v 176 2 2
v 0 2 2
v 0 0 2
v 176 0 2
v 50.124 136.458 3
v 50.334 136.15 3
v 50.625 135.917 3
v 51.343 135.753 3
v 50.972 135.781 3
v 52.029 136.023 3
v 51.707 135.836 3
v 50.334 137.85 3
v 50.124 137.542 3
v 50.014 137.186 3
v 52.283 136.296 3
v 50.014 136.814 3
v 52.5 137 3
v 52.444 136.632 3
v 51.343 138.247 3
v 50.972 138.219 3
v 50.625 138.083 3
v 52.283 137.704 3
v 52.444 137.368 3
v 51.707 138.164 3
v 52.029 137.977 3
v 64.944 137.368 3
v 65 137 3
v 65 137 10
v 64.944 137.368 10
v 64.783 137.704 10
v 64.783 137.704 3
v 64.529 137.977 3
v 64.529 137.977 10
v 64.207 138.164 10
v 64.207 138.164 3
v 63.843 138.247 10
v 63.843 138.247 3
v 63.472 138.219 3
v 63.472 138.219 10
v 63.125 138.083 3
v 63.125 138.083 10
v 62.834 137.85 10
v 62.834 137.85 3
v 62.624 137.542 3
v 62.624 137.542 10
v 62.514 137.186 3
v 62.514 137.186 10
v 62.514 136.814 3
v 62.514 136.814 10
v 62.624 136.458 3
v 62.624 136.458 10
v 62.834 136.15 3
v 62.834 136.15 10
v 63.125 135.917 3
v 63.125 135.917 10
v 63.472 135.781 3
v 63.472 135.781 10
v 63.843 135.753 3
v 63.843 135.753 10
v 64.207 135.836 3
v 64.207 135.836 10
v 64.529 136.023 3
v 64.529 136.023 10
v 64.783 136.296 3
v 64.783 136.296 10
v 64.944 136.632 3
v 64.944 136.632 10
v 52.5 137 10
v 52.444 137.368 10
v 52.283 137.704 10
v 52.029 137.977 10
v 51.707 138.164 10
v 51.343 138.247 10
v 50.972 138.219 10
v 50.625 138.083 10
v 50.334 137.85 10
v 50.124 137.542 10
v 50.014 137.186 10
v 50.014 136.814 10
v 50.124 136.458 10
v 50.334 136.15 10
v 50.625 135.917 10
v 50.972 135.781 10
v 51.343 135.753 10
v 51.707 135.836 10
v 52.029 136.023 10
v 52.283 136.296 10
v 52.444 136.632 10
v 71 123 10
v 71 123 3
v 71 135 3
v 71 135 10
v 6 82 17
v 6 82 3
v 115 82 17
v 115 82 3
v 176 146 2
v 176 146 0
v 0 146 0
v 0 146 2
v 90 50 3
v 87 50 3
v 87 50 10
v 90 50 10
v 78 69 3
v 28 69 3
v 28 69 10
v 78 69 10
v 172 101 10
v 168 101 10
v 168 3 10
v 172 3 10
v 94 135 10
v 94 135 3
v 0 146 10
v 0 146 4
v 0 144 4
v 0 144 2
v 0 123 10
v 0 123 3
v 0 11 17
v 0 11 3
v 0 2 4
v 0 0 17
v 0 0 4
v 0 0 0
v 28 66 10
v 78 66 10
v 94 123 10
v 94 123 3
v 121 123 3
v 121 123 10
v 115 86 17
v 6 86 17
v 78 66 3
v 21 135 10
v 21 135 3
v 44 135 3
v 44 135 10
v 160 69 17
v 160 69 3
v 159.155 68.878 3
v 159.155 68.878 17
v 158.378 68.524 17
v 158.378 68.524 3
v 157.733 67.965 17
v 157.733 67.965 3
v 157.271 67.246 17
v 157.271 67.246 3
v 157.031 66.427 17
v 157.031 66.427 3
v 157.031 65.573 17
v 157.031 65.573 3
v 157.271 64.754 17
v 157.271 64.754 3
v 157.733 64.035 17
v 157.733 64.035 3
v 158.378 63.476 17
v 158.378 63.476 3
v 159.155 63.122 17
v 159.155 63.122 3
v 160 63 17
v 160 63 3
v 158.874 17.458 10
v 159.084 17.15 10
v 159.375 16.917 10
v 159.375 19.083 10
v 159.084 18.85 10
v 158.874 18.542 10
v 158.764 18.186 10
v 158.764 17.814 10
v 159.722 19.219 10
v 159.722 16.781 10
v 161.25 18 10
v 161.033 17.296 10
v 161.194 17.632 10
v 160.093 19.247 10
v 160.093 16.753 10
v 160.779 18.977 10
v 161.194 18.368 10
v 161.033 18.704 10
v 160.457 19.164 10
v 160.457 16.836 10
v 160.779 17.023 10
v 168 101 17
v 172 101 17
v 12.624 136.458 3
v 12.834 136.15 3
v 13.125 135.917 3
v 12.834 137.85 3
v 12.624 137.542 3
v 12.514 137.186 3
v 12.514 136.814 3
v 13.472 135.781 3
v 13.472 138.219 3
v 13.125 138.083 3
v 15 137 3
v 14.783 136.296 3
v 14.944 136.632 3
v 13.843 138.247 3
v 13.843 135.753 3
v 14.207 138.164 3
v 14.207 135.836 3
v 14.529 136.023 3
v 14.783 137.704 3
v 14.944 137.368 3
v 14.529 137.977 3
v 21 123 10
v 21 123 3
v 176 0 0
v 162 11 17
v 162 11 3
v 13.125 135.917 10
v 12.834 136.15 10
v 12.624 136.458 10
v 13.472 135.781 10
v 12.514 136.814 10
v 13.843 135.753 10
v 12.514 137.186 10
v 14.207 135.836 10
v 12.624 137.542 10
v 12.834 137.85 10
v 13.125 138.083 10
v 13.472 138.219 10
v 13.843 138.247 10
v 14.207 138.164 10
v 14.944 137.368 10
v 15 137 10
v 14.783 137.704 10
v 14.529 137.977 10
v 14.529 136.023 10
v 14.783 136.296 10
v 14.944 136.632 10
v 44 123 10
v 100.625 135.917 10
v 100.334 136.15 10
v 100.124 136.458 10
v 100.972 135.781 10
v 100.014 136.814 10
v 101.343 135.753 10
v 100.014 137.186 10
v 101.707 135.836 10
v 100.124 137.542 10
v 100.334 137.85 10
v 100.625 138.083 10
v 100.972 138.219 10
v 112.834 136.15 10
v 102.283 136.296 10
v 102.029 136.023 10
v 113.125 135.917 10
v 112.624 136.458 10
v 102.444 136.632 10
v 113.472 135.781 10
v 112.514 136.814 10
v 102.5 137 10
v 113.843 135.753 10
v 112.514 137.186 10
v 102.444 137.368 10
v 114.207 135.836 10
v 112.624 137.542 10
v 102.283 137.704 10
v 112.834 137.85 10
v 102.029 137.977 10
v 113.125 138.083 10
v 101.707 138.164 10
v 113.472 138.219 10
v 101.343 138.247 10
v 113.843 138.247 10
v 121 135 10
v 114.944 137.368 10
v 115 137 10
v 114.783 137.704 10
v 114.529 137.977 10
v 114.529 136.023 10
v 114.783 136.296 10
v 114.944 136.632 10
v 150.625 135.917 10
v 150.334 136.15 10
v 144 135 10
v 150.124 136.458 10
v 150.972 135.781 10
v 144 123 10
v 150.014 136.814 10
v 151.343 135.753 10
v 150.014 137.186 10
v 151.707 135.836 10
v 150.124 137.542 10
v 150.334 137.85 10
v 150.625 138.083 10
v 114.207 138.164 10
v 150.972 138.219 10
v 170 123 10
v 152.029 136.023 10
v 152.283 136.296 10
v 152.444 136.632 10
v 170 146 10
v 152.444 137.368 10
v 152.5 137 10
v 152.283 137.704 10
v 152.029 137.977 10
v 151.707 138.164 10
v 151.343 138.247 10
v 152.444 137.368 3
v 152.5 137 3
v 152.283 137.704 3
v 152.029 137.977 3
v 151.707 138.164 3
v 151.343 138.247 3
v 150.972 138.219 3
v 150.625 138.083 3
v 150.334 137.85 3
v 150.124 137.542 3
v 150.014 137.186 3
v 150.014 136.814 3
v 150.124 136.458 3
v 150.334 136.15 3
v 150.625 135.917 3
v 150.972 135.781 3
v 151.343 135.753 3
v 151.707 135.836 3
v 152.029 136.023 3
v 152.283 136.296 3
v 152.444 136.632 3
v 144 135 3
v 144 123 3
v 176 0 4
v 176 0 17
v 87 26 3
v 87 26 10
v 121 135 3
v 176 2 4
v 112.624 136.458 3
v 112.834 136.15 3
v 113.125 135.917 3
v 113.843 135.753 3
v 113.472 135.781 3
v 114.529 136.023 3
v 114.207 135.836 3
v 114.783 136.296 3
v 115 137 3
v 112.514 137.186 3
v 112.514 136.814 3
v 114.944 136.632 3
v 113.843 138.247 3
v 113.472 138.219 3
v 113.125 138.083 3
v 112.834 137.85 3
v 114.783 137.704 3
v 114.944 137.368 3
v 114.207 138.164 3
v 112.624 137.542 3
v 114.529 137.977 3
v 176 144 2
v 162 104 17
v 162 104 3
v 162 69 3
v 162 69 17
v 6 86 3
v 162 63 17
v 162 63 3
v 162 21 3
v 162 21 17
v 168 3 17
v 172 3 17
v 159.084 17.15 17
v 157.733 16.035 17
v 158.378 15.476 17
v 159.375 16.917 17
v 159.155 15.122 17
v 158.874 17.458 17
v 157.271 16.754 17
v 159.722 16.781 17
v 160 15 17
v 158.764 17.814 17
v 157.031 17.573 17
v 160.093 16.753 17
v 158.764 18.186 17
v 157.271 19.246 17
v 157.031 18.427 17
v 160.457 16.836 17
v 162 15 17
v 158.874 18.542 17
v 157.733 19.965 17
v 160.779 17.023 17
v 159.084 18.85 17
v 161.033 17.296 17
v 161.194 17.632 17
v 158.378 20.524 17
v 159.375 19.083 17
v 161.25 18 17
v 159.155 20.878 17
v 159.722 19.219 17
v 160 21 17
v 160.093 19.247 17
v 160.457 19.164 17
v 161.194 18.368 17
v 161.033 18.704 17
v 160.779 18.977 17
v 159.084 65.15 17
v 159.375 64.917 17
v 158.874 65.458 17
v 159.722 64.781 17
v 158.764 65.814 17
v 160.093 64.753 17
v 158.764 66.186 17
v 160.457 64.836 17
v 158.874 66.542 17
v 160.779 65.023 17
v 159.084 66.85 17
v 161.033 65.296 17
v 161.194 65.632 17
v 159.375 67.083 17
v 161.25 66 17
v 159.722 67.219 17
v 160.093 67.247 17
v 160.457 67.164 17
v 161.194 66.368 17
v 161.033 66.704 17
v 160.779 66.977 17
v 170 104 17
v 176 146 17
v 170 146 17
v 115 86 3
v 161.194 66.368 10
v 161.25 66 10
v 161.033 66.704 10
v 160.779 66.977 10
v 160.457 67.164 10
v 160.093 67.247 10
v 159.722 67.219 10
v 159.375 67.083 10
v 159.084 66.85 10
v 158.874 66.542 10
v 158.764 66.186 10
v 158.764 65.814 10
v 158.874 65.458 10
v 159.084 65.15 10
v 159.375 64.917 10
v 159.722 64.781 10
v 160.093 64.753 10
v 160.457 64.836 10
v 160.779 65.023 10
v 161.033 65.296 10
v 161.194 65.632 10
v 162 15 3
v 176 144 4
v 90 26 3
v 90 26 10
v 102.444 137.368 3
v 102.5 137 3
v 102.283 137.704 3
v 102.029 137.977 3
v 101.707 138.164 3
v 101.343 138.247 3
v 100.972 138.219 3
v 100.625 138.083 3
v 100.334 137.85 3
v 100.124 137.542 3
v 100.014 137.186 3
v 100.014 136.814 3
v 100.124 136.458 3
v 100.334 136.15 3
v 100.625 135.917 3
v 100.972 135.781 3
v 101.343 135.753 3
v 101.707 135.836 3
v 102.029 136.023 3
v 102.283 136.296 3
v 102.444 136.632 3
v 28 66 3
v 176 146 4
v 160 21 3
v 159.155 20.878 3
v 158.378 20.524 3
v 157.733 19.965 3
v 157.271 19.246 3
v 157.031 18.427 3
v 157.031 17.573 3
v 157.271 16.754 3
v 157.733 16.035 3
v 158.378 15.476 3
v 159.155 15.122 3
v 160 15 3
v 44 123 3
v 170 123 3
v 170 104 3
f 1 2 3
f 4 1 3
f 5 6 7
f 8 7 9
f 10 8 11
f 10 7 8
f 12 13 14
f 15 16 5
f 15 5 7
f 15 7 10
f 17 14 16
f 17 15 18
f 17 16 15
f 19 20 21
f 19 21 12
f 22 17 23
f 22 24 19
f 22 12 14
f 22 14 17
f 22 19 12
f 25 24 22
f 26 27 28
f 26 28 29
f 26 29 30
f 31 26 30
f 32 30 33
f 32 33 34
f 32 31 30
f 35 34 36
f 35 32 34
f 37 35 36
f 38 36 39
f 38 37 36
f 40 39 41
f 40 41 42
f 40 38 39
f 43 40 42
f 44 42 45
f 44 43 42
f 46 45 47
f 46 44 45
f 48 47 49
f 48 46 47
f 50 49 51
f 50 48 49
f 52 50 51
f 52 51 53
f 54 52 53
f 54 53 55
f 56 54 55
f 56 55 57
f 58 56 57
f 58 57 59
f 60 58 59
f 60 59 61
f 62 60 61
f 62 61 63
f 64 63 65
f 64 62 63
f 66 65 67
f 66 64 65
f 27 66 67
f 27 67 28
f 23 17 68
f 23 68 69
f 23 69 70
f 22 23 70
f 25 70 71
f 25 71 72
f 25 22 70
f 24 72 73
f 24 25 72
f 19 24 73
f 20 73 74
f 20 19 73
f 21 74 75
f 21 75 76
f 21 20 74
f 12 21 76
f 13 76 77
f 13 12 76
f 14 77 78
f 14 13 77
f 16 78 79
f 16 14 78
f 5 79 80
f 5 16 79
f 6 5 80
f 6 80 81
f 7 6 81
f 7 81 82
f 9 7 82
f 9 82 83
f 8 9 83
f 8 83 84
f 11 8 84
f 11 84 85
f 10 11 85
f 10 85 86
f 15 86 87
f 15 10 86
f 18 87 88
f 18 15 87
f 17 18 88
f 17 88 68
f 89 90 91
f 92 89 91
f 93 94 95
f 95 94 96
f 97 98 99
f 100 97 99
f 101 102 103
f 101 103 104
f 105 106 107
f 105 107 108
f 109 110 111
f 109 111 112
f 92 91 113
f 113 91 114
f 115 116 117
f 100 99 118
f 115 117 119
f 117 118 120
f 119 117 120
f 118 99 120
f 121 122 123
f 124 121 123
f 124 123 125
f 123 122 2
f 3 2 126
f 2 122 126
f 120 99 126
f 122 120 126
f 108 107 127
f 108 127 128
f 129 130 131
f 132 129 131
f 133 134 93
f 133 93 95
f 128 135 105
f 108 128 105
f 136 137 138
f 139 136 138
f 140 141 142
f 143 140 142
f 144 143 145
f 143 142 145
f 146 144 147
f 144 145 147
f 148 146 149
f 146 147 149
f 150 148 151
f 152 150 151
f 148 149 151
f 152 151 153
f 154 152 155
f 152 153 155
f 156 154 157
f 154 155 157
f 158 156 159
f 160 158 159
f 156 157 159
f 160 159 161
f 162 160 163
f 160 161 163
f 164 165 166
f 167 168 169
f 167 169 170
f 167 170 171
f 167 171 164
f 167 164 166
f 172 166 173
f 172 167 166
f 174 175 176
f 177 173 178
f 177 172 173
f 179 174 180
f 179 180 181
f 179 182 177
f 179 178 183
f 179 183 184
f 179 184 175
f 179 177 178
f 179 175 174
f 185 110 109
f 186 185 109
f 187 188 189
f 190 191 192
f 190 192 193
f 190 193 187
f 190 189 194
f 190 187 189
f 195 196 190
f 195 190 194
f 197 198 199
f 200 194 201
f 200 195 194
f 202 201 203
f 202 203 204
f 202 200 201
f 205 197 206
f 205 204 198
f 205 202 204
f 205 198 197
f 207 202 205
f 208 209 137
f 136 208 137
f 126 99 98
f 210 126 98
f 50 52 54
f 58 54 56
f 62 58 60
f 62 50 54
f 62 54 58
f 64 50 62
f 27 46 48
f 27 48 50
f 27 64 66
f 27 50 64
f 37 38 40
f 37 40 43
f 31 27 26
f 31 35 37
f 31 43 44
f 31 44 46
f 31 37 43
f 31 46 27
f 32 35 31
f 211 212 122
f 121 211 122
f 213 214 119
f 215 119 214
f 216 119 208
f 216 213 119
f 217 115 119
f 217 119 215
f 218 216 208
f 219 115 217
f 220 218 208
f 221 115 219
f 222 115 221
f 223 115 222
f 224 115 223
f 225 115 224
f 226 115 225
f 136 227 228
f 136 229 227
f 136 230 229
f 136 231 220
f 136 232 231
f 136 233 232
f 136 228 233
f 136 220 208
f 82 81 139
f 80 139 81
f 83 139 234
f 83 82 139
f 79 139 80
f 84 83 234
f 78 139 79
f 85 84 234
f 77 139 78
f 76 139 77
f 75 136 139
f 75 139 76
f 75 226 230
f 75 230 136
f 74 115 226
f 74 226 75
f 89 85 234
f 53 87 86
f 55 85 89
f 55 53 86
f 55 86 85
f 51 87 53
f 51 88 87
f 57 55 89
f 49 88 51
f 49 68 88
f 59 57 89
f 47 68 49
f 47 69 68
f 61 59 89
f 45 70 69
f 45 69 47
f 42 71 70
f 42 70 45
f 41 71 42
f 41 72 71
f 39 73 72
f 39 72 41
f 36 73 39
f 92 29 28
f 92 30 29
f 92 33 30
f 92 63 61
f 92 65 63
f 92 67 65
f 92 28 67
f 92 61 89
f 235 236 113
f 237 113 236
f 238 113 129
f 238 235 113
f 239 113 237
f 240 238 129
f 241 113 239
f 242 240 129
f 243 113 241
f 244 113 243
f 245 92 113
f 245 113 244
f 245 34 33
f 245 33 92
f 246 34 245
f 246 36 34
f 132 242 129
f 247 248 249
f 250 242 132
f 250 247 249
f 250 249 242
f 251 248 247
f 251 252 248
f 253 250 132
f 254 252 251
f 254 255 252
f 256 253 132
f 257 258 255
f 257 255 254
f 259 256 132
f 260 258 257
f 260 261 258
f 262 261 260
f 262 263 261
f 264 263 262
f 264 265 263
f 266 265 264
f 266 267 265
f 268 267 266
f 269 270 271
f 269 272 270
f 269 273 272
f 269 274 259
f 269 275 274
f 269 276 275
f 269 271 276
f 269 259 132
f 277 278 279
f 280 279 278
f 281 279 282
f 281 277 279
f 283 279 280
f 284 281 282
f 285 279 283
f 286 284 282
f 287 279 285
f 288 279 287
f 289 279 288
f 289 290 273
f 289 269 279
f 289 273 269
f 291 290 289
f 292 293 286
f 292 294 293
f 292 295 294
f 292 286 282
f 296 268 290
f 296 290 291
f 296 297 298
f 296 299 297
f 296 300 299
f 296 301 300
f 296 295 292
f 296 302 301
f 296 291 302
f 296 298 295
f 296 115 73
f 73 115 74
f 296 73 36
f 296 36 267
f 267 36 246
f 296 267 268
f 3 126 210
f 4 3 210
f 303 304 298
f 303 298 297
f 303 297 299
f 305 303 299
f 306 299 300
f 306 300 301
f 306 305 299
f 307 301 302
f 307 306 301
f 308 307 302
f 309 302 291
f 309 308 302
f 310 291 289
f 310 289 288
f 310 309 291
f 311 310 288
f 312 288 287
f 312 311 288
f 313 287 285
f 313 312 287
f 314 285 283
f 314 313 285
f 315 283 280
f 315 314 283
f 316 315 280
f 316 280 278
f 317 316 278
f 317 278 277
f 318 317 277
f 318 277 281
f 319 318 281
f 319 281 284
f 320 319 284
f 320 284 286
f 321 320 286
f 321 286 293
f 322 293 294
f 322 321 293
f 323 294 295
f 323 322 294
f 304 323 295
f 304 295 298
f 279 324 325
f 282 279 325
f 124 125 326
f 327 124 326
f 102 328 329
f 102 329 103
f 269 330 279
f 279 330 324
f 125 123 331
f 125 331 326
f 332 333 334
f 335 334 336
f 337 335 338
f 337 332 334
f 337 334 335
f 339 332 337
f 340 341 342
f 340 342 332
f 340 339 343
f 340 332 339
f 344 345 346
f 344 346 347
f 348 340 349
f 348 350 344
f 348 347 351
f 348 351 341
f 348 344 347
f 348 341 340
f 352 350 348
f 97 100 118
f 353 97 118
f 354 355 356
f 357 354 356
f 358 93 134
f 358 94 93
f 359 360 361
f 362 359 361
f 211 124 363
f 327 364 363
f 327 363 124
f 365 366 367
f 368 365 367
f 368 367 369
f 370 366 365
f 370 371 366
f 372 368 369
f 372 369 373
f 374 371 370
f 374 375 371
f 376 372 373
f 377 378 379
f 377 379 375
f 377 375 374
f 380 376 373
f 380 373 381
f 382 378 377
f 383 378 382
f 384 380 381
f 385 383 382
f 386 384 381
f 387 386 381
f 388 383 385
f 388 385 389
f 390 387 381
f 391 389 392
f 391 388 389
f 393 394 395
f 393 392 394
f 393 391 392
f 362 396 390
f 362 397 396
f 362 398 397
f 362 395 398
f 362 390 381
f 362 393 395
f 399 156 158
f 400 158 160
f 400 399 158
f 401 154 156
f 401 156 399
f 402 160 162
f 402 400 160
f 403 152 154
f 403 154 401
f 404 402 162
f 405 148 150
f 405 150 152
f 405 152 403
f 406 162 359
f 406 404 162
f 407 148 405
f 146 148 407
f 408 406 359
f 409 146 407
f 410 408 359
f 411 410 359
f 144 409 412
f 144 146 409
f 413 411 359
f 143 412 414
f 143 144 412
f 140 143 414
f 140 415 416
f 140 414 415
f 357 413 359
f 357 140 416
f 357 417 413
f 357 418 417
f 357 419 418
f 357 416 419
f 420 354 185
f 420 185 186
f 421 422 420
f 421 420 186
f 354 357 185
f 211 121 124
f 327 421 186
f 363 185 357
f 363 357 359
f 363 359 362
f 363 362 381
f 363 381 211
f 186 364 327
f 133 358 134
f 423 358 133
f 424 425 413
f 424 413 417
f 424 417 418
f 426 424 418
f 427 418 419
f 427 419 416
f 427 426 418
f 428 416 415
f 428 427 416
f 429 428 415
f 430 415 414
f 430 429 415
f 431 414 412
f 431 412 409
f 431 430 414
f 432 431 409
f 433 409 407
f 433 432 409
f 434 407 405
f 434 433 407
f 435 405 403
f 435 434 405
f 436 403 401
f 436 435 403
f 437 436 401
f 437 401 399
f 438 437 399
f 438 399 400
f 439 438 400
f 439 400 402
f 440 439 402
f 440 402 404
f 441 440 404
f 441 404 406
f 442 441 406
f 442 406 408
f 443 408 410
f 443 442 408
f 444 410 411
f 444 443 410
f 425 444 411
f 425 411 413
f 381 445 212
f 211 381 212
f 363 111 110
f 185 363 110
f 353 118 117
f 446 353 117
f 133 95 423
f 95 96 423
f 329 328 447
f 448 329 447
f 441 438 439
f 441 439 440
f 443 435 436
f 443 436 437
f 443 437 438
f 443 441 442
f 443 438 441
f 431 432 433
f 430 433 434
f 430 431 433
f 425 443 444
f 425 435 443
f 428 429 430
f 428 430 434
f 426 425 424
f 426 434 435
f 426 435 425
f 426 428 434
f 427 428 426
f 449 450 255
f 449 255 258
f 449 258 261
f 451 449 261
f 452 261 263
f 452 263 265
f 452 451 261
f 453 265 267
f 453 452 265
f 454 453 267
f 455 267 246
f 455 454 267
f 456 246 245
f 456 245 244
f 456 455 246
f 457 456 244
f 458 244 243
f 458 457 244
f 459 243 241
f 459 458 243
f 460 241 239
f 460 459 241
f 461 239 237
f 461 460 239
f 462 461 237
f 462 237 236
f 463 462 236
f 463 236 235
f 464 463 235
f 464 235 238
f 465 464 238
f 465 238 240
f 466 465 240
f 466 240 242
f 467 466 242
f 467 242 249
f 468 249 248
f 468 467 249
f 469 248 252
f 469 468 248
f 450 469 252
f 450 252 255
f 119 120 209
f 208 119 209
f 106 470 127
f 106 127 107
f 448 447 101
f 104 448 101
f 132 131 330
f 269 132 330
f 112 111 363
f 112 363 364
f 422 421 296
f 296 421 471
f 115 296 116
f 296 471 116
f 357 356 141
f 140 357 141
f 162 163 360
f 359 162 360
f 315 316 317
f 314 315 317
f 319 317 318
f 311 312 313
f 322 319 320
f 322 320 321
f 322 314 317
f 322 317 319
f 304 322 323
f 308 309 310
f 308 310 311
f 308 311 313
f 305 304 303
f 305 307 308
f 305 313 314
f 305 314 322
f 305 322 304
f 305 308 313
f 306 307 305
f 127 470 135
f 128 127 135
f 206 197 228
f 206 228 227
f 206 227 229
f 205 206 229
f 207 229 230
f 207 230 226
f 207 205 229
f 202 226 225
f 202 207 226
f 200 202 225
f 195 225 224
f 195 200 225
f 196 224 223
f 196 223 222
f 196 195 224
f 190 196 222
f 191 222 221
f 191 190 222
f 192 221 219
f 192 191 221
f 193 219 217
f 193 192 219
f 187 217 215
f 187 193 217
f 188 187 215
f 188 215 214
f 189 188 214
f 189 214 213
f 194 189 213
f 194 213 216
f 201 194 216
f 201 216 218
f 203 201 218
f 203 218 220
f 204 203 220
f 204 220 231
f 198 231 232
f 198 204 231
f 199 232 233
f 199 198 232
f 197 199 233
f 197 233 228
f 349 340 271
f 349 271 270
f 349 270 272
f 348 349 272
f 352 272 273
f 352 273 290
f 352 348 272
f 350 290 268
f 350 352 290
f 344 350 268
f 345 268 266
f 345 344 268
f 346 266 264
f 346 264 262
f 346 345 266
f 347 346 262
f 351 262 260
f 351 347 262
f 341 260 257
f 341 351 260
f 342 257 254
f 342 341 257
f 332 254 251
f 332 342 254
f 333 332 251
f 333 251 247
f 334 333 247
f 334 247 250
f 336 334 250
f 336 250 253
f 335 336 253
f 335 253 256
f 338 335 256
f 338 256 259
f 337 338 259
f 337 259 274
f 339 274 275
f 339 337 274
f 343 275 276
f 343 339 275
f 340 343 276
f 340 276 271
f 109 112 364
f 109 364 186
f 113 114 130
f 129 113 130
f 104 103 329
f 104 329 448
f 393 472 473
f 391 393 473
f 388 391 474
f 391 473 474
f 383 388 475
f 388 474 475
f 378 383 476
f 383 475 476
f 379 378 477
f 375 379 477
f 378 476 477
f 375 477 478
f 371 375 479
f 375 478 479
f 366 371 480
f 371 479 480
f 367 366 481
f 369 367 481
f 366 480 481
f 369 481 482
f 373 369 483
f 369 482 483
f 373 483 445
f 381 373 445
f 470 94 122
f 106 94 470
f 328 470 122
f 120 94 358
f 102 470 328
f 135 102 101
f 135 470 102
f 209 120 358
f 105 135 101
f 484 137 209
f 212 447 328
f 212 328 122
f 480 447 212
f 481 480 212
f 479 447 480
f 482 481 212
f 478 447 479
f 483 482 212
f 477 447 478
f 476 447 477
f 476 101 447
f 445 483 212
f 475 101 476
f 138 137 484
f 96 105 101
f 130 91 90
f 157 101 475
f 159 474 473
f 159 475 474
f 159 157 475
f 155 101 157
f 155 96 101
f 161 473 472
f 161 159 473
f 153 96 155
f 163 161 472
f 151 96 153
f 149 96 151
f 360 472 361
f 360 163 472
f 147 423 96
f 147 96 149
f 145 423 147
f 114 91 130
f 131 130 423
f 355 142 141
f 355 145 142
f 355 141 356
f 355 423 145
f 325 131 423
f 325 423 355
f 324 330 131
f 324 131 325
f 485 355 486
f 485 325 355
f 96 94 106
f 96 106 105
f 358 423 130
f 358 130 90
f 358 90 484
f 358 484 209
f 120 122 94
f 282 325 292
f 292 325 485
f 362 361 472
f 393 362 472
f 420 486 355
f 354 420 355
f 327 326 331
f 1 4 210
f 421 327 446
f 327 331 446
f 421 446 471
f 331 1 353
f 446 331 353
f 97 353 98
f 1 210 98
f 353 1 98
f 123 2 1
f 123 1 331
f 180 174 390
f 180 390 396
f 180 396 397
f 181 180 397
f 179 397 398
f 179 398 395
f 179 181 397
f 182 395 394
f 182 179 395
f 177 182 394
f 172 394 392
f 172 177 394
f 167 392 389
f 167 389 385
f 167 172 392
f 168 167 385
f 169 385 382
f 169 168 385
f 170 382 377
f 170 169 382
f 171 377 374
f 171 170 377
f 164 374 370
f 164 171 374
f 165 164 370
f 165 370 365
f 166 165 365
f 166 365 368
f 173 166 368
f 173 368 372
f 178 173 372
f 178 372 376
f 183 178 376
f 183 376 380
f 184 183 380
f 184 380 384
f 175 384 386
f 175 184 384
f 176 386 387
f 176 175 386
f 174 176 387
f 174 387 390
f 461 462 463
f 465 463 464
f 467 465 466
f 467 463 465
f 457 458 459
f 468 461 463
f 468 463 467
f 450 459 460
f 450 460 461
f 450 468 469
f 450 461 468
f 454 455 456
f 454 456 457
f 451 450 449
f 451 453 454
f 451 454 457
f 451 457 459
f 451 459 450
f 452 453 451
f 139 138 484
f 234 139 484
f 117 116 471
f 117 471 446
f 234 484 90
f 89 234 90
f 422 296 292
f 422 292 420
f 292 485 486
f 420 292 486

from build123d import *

# Parameters (mm, degrees)
F0_W      = 176
F0_H      = 146
F1_DEPTH  = 3
F2_W      = 50
F2_H      = 3
F2_W_2    = 3
F2_H_2    = 24
F2_W_3    = 109
F2_H_3    = 4
F2_R      = 1.25
F3_DEPTH  = 7
F3_FACE_W = 109
F3_FACE_H = 4
F4_R      = 1.25
F4_W      = 4
F4_H      = 98
F5_DEPTH  = 7
F6_W      = 2
F6_H      = 2
F7_DEPTH  = 176


# Not quite as in the source:
# - a feature names something its author has since deleted; it is built from what else it names


with BuildPart() as f1:
    # F0 (on Top) → F1 (new body)
    with BuildSketch(Plane.XY):
        with Locations((88, 73)):
            Rectangle(F0_W, F0_H)
    extrude(amount=F1_DEPTH)

    # F2 (on face) → F3 (join)
    with BuildSketch(Plane.XY.offset(3)):
        with Locations((53, 67.5)):
            Rectangle(F2_W, F2_H)
        with Locations((88.5, 38)):
            Rectangle(F2_W_2, F2_H_2)
        with Locations((60.5, 84)):
            Rectangle(F2_W_3, F2_H_3)
        with BuildLine():
            Line((0, 123), (6, 123))
            Line((6, 123), (21, 123))
            Line((21, 123), (21, 135))
            Line((21, 135), (44, 135))
            Line((44, 135), (44, 123))
            Line((44, 123), (71, 123))
            Line((71, 123), (71, 135))
            Line((71, 135), (94, 135))
            Line((94, 135), (94, 123))
            Line((94, 123), (121, 123))
            Line((121, 123), (121, 135))
            Line((121, 135), (144, 135))
            Line((144, 135), (144, 123))
            Line((144, 123), (170, 123))
            Line((170, 123), (170, 104))
            Line((170, 104), (162, 104))
            Line((162, 104), (162, 69))
            Line((162, 69), (160, 69))
            ThreePointArc((160, 69), (157, 66), (160, 63))
            Line((160, 63), (162, 63))
            Line((162, 63), (162, 21))
            Line((162, 21), (160, 21))
            ThreePointArc((160, 21), (157, 18), (160, 15))
            Line((160, 15), (162, 15))
            Line((162, 15), (162, 11))
            Line((162, 11), (0, 11))
            Line((0, 11), (0, 0))
            Line((0, 0), (176, 0))
            Line((176, 0), (176, 146))
            Line((176, 146), (0, 146))
            Line((0, 146), (0, 123))
        make_face()
        with Locations((13.75, 137)):
            Circle(F2_R, mode=Mode.SUBTRACT)
        with Locations((51.25, 137)):
            Circle(F2_R, mode=Mode.SUBTRACT)
        with Locations((63.75, 137)):
            Circle(F2_R, mode=Mode.SUBTRACT)
        with Locations((101.25, 137)):
            Circle(F2_R, mode=Mode.SUBTRACT)
        with Locations((113.75, 137)):
            Circle(F2_R, mode=Mode.SUBTRACT)
        with Locations((151.25, 137)):
            Circle(F2_R, mode=Mode.SUBTRACT)
    extrude(amount=F3_DEPTH)

    # F3_face (on face) + F4 (on face) → F5 (join)
    with BuildSketch(Plane(origin=(60.5, 84, 10), x_dir=(1, 0, 0), z_dir=(0, 0, 1))):
        Rectangle(F3_FACE_W, F3_FACE_H)
    with BuildSketch(Plane.XY.offset(10)):
        with BuildLine():
            Line((170, 146), (170, 123))
            Line((170, 123), (170, 104))
            Line((170, 104), (162, 104))
            Line((162, 104), (162, 69))
            Line((162, 69), (160, 69))
            ThreePointArc((160, 69), (157, 66), (160, 63))
            Line((160, 63), (162, 63))
            Line((162, 63), (162, 21))
            Line((162, 21), (160, 21))
            ThreePointArc((160, 21), (157, 18), (160, 15))
            Line((160, 15), (162, 15))
            Line((162, 15), (162, 11))
            Line((162, 11), (0, 11))
            Line((0, 11), (0, 0))
            Line((0, 0), (176, 0))
            Line((176, 0), (176, 146))
            Line((176, 146), (170, 146))
        make_face()
        with Locations((160, 18)):
            Circle(F4_R, mode=Mode.SUBTRACT)
        with Locations((170, 52)):
            Rectangle(F4_W, F4_H, mode=Mode.SUBTRACT)
        with Locations((160, 66)):
            Circle(F4_R, mode=Mode.SUBTRACT)
    extrude(amount=F5_DEPTH)

    # F6 (on face) → F7 (cut)
    with BuildSketch(Plane(origin=(0, 0, 0), x_dir=(0, -1, 0), z_dir=(-1, 0, 0))):
        with Locations((-145, 3)):
            Rectangle(F6_W, F6_H)
        with Locations((-1, 3)):
            Rectangle(F6_W, F6_H)
    extrude(amount=-F7_DEPTH, mode=Mode.SUBTRACT)


solid = f1.part
